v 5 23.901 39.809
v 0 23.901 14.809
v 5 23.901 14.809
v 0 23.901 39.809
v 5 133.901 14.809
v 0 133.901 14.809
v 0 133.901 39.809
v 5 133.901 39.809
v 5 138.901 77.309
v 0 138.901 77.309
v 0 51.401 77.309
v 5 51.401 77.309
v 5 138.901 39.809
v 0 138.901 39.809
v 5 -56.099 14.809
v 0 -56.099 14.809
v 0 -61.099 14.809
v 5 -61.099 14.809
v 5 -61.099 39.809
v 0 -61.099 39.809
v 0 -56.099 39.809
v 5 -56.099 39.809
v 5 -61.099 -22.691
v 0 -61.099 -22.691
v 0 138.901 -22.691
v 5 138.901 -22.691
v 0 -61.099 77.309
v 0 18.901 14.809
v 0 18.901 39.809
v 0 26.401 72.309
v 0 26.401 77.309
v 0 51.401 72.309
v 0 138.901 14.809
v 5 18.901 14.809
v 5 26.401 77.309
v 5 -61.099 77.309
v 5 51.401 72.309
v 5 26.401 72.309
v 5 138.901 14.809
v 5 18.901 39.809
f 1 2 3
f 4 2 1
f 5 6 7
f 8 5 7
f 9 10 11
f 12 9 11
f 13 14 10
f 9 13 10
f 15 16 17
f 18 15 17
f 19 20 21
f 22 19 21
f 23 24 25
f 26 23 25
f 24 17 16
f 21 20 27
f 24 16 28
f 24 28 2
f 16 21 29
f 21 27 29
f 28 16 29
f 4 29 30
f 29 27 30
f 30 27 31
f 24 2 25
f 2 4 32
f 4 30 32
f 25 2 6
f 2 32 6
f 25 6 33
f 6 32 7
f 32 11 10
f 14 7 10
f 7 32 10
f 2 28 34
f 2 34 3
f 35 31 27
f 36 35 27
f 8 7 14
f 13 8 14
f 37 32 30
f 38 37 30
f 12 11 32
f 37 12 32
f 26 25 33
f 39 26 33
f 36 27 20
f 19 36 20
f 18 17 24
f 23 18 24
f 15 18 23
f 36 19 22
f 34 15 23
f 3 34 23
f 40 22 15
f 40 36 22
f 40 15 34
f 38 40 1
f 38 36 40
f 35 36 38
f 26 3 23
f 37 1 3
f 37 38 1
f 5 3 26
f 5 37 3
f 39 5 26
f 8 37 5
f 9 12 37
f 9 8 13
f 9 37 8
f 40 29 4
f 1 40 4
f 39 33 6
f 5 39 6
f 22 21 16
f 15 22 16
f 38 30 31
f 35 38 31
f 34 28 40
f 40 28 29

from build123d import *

# Parameters (mm, degrees)
F0_W     = 5
F0_H     = 25
F1_DEPTH = 5


# Not quite as in the source:
# - a feature names something its author has since deleted; it is built from what else it names


with BuildPart() as f1:
    # F0 (on Right) → F1 (new body)
    with BuildSketch(Plane.YZ):
        Polygon((138.9010111106, 39.8091464203), (138.9010111106, 77.3091464203), (51.4010111106, 77.3091464203), (51.4010111106, 72.3091464203), (26.4010111106, 72.3091464203), (26.4010111106, 77.3091464203), (-61.0989888894, 77.3091464203), (-61.0989888894, 39.8091464203), (-56.0989888894, 39.8091464203), (-56.0989888894, 14.8091464203), (-61.0989888894, 14.8091464203), (-61.0989888894, -22.6908535797), (138.9010111106, -22.6908535797), (138.9010111106, 14.8091464203), (133.9010111106, 14.8091464203), (133.9010111106, 39.8091464203), align=None)
        with Locations((21.4010111106, 27.3091464203)):
            Rectangle(F0_W, F0_H, mode=Mode.SUBTRACT)
    extrude(amount=F1_DEPTH)


solid = f1.part
